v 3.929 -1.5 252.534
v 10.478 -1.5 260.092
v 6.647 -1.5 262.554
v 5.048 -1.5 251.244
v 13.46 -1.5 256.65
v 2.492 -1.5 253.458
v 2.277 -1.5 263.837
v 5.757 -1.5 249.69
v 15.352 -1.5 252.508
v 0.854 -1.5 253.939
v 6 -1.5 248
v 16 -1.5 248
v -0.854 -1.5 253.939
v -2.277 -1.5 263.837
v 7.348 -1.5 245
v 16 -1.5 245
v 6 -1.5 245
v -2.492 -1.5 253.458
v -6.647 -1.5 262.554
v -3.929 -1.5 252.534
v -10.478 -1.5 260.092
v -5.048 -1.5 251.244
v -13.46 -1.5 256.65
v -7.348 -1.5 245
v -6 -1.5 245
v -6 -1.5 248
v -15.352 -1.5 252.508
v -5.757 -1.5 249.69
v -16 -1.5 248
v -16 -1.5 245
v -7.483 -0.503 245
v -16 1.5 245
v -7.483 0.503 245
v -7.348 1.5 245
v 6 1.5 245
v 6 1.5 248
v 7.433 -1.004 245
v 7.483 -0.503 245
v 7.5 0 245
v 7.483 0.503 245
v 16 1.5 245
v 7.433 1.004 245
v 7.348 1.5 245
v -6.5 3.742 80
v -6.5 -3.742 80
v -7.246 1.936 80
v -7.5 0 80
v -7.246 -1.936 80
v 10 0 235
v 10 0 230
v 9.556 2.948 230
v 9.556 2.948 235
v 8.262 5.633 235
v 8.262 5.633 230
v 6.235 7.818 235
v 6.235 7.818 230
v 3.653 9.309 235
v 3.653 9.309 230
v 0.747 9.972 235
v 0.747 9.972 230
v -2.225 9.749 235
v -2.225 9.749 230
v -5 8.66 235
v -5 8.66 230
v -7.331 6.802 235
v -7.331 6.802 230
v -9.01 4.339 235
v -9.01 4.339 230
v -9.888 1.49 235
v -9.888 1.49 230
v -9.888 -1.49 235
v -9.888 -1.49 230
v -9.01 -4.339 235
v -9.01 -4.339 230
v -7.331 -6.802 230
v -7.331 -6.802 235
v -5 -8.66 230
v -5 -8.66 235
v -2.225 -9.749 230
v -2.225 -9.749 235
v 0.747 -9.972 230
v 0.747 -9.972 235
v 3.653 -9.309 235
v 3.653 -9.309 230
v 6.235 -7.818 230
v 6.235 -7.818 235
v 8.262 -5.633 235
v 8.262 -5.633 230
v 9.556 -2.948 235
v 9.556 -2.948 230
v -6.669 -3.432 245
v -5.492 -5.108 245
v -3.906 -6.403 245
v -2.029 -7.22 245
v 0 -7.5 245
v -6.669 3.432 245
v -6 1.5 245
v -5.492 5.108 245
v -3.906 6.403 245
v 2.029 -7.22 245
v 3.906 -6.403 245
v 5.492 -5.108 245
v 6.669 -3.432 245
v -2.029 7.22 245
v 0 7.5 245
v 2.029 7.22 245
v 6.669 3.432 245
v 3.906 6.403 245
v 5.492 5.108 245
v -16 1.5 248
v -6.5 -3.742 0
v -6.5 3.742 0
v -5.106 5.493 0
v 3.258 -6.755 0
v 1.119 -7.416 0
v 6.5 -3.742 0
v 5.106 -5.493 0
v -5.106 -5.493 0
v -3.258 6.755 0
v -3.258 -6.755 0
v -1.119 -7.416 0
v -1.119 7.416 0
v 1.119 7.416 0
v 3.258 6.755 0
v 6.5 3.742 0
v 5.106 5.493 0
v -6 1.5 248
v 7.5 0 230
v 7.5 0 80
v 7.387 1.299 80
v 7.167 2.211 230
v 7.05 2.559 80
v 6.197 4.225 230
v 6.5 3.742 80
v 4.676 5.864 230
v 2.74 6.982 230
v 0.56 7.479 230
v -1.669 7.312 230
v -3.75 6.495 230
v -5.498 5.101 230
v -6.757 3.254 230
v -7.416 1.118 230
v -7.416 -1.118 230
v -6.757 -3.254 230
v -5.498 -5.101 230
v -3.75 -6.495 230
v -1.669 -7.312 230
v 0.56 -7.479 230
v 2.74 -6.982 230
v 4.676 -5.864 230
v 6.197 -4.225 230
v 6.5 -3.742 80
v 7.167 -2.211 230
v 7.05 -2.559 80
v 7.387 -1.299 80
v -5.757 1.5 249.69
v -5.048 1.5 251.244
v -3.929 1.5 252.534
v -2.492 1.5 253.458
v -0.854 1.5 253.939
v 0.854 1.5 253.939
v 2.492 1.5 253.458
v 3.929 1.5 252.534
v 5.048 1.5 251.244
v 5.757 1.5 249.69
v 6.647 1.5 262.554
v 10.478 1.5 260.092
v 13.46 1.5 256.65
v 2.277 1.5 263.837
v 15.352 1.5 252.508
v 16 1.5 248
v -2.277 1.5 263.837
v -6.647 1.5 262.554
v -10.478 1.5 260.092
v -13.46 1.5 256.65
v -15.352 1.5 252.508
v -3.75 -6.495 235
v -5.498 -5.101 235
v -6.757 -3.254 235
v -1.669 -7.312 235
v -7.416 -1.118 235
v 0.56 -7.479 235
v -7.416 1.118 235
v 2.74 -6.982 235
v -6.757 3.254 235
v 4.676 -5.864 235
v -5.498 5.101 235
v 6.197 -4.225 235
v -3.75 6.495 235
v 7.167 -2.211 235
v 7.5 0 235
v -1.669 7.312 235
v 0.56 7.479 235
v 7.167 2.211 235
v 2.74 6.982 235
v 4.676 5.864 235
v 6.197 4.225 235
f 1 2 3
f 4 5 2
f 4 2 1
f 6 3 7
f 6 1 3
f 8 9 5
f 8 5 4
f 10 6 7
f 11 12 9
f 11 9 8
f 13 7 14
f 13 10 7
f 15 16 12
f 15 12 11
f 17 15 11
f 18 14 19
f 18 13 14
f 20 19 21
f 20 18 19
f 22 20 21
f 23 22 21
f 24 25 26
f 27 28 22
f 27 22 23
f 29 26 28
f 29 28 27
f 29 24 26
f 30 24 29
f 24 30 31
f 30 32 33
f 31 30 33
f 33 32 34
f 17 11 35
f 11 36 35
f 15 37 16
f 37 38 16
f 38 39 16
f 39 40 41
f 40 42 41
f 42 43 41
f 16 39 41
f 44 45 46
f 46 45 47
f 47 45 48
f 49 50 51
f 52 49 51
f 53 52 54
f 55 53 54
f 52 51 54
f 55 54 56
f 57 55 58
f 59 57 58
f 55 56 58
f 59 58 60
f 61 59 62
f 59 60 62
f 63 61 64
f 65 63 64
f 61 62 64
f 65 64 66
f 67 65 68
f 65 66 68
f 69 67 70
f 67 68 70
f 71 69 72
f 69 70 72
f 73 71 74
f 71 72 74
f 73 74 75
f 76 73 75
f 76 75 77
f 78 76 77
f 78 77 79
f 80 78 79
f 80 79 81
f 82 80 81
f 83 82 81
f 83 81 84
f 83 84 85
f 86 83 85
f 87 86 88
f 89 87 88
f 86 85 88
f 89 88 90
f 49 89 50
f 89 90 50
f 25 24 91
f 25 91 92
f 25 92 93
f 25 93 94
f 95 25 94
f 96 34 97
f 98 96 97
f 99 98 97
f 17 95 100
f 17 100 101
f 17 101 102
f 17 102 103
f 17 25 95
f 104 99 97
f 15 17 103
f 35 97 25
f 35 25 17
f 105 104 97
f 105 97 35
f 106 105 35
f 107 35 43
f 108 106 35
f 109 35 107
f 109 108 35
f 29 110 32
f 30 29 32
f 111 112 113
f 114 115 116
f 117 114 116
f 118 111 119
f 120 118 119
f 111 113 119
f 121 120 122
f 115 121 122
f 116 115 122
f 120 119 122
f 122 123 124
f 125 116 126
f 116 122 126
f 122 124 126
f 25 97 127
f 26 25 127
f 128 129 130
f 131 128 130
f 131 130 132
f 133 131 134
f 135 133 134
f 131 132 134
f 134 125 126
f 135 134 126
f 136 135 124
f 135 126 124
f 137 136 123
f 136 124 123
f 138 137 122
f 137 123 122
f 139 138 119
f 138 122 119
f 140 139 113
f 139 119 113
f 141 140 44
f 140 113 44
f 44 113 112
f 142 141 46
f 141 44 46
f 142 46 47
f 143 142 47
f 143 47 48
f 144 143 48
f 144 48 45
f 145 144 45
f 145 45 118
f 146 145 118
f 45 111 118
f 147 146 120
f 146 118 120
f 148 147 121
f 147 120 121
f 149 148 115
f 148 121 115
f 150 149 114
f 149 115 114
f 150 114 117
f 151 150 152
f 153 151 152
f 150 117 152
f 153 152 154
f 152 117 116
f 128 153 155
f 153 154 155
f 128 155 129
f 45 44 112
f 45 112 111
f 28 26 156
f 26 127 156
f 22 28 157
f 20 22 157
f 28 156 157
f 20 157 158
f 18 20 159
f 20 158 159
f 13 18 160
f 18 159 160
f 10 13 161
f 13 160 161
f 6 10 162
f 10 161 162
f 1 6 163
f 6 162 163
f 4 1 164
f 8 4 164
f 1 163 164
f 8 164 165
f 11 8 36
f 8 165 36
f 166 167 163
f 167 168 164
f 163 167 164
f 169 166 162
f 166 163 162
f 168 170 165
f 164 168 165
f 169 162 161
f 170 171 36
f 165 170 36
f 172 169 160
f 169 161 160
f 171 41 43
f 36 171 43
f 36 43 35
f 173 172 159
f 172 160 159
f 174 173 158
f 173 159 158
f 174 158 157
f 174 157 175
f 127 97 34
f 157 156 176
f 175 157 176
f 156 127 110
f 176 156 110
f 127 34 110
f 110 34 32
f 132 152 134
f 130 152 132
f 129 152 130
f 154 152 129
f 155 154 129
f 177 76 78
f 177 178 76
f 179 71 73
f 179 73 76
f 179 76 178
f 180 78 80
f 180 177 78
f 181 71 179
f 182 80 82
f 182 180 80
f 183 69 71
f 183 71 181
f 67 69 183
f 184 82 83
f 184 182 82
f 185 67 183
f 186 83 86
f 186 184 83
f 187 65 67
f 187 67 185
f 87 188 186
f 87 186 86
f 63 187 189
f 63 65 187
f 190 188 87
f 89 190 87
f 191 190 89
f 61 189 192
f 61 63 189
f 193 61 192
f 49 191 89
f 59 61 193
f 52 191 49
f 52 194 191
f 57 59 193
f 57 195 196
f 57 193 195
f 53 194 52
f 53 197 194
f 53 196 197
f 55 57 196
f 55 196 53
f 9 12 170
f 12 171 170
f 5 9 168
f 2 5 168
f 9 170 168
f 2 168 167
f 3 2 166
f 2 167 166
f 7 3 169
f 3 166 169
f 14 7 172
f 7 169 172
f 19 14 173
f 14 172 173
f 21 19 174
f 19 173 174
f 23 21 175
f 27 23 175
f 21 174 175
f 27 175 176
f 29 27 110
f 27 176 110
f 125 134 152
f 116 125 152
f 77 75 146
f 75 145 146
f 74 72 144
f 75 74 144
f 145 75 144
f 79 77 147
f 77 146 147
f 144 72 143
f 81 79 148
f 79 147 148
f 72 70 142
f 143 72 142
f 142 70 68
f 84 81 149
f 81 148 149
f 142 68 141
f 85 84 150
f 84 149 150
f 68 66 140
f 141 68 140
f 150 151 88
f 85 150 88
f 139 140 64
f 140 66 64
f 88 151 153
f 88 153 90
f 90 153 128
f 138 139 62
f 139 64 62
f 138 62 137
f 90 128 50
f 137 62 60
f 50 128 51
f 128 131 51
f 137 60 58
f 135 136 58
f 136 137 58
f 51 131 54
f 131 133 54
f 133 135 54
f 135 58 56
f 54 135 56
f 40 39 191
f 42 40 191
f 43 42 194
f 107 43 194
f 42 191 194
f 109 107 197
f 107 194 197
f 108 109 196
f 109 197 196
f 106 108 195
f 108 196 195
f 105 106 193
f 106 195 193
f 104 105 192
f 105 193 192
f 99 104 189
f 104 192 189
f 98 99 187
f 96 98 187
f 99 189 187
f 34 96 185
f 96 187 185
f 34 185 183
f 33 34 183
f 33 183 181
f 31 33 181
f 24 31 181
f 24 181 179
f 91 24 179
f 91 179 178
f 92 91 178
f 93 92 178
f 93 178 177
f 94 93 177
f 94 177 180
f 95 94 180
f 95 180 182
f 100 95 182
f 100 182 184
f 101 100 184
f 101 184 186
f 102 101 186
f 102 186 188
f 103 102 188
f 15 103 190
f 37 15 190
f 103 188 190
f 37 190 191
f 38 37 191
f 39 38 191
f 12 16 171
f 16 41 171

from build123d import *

# Parameters (mm, degrees)
SKETCH1_R           = 7.5
BOSS_EXTRUDE1_DEPTH = 230
SKETCH2_R           = 10
BOSS_EXTRUDE2_DEPTH = 5
SKETCH3_R           = 7.5
BOSS_EXTRUDE3_DEPTH = 10
CUT_EXTRUDE1_DEPTH  = 80
EXTRUDE_THIN1_DEPTH = 1.5


with BuildPart() as part:
    # Sketch1 → Boss-Extrude1 (new body)
    with BuildSketch(Plane.XY):
        Circle(SKETCH1_R)
    extrude(amount=BOSS_EXTRUDE1_DEPTH)

    # Sketch2 → Boss-Extrude2 (add)
    with BuildSketch(Plane.XY.offset(230)):
        Circle(SKETCH2_R)
    extrude(amount=BOSS_EXTRUDE2_DEPTH)

    # Sketch3 → Boss-Extrude3 (add)
    with BuildSketch(Plane.XY.offset(235)):
        Circle(SKETCH3_R)
    extrude(amount=BOSS_EXTRUDE3_DEPTH)

    # Sketch4 → Cut-Extrude1 (cut)
    with BuildSketch(Plane(origin=(0, 0, 0), x_dir=(-1, 0, 0), z_dir=(0, 0, -1))):
        with BuildLine():
            Line((-6.5, 3.741657387), (-6.5, -3.741657387))
            ThreePointArc((-6.5, -3.741657387), (-7.5, 0), (-6.5, 3.741657387))
        make_face()
        with BuildLine():
            Line((6.5, 3.741657387), (6.5, -3.741657387))
            ThreePointArc((6.5, -3.741657387), (7.5, 0), (6.5, 3.741657387))
        make_face()
    extrude(amount=-CUT_EXTRUDE1_DEPTH, mode=Mode.SUBTRACT)

    # Sketch5 → Extrude-Thin1 (add, symmetric)
    with BuildSketch(Plane(origin=(0, 0, 0), x_dir=(1, 0, 0), z_dir=(0, 1, 0))):
        with BuildLine():
            Line((-6, -245), (-6, -248))
            ThreePointArc((-6, -248), (0, -254), (6, -248))
            Line((6, -248), (6, -245))
            Line((6, -245), (16, -245))
            Line((16, -245), (16, -248))
            ThreePointArc((16, -248), (0, -264), (-16, -248))
            Line((-16, -248), (-16, -245))
            Line((-16, -245), (-6, -245))
        make_face()
    extrude(amount=EXTRUDE_THIN1_DEPTH, both=True)


solid = part.part
